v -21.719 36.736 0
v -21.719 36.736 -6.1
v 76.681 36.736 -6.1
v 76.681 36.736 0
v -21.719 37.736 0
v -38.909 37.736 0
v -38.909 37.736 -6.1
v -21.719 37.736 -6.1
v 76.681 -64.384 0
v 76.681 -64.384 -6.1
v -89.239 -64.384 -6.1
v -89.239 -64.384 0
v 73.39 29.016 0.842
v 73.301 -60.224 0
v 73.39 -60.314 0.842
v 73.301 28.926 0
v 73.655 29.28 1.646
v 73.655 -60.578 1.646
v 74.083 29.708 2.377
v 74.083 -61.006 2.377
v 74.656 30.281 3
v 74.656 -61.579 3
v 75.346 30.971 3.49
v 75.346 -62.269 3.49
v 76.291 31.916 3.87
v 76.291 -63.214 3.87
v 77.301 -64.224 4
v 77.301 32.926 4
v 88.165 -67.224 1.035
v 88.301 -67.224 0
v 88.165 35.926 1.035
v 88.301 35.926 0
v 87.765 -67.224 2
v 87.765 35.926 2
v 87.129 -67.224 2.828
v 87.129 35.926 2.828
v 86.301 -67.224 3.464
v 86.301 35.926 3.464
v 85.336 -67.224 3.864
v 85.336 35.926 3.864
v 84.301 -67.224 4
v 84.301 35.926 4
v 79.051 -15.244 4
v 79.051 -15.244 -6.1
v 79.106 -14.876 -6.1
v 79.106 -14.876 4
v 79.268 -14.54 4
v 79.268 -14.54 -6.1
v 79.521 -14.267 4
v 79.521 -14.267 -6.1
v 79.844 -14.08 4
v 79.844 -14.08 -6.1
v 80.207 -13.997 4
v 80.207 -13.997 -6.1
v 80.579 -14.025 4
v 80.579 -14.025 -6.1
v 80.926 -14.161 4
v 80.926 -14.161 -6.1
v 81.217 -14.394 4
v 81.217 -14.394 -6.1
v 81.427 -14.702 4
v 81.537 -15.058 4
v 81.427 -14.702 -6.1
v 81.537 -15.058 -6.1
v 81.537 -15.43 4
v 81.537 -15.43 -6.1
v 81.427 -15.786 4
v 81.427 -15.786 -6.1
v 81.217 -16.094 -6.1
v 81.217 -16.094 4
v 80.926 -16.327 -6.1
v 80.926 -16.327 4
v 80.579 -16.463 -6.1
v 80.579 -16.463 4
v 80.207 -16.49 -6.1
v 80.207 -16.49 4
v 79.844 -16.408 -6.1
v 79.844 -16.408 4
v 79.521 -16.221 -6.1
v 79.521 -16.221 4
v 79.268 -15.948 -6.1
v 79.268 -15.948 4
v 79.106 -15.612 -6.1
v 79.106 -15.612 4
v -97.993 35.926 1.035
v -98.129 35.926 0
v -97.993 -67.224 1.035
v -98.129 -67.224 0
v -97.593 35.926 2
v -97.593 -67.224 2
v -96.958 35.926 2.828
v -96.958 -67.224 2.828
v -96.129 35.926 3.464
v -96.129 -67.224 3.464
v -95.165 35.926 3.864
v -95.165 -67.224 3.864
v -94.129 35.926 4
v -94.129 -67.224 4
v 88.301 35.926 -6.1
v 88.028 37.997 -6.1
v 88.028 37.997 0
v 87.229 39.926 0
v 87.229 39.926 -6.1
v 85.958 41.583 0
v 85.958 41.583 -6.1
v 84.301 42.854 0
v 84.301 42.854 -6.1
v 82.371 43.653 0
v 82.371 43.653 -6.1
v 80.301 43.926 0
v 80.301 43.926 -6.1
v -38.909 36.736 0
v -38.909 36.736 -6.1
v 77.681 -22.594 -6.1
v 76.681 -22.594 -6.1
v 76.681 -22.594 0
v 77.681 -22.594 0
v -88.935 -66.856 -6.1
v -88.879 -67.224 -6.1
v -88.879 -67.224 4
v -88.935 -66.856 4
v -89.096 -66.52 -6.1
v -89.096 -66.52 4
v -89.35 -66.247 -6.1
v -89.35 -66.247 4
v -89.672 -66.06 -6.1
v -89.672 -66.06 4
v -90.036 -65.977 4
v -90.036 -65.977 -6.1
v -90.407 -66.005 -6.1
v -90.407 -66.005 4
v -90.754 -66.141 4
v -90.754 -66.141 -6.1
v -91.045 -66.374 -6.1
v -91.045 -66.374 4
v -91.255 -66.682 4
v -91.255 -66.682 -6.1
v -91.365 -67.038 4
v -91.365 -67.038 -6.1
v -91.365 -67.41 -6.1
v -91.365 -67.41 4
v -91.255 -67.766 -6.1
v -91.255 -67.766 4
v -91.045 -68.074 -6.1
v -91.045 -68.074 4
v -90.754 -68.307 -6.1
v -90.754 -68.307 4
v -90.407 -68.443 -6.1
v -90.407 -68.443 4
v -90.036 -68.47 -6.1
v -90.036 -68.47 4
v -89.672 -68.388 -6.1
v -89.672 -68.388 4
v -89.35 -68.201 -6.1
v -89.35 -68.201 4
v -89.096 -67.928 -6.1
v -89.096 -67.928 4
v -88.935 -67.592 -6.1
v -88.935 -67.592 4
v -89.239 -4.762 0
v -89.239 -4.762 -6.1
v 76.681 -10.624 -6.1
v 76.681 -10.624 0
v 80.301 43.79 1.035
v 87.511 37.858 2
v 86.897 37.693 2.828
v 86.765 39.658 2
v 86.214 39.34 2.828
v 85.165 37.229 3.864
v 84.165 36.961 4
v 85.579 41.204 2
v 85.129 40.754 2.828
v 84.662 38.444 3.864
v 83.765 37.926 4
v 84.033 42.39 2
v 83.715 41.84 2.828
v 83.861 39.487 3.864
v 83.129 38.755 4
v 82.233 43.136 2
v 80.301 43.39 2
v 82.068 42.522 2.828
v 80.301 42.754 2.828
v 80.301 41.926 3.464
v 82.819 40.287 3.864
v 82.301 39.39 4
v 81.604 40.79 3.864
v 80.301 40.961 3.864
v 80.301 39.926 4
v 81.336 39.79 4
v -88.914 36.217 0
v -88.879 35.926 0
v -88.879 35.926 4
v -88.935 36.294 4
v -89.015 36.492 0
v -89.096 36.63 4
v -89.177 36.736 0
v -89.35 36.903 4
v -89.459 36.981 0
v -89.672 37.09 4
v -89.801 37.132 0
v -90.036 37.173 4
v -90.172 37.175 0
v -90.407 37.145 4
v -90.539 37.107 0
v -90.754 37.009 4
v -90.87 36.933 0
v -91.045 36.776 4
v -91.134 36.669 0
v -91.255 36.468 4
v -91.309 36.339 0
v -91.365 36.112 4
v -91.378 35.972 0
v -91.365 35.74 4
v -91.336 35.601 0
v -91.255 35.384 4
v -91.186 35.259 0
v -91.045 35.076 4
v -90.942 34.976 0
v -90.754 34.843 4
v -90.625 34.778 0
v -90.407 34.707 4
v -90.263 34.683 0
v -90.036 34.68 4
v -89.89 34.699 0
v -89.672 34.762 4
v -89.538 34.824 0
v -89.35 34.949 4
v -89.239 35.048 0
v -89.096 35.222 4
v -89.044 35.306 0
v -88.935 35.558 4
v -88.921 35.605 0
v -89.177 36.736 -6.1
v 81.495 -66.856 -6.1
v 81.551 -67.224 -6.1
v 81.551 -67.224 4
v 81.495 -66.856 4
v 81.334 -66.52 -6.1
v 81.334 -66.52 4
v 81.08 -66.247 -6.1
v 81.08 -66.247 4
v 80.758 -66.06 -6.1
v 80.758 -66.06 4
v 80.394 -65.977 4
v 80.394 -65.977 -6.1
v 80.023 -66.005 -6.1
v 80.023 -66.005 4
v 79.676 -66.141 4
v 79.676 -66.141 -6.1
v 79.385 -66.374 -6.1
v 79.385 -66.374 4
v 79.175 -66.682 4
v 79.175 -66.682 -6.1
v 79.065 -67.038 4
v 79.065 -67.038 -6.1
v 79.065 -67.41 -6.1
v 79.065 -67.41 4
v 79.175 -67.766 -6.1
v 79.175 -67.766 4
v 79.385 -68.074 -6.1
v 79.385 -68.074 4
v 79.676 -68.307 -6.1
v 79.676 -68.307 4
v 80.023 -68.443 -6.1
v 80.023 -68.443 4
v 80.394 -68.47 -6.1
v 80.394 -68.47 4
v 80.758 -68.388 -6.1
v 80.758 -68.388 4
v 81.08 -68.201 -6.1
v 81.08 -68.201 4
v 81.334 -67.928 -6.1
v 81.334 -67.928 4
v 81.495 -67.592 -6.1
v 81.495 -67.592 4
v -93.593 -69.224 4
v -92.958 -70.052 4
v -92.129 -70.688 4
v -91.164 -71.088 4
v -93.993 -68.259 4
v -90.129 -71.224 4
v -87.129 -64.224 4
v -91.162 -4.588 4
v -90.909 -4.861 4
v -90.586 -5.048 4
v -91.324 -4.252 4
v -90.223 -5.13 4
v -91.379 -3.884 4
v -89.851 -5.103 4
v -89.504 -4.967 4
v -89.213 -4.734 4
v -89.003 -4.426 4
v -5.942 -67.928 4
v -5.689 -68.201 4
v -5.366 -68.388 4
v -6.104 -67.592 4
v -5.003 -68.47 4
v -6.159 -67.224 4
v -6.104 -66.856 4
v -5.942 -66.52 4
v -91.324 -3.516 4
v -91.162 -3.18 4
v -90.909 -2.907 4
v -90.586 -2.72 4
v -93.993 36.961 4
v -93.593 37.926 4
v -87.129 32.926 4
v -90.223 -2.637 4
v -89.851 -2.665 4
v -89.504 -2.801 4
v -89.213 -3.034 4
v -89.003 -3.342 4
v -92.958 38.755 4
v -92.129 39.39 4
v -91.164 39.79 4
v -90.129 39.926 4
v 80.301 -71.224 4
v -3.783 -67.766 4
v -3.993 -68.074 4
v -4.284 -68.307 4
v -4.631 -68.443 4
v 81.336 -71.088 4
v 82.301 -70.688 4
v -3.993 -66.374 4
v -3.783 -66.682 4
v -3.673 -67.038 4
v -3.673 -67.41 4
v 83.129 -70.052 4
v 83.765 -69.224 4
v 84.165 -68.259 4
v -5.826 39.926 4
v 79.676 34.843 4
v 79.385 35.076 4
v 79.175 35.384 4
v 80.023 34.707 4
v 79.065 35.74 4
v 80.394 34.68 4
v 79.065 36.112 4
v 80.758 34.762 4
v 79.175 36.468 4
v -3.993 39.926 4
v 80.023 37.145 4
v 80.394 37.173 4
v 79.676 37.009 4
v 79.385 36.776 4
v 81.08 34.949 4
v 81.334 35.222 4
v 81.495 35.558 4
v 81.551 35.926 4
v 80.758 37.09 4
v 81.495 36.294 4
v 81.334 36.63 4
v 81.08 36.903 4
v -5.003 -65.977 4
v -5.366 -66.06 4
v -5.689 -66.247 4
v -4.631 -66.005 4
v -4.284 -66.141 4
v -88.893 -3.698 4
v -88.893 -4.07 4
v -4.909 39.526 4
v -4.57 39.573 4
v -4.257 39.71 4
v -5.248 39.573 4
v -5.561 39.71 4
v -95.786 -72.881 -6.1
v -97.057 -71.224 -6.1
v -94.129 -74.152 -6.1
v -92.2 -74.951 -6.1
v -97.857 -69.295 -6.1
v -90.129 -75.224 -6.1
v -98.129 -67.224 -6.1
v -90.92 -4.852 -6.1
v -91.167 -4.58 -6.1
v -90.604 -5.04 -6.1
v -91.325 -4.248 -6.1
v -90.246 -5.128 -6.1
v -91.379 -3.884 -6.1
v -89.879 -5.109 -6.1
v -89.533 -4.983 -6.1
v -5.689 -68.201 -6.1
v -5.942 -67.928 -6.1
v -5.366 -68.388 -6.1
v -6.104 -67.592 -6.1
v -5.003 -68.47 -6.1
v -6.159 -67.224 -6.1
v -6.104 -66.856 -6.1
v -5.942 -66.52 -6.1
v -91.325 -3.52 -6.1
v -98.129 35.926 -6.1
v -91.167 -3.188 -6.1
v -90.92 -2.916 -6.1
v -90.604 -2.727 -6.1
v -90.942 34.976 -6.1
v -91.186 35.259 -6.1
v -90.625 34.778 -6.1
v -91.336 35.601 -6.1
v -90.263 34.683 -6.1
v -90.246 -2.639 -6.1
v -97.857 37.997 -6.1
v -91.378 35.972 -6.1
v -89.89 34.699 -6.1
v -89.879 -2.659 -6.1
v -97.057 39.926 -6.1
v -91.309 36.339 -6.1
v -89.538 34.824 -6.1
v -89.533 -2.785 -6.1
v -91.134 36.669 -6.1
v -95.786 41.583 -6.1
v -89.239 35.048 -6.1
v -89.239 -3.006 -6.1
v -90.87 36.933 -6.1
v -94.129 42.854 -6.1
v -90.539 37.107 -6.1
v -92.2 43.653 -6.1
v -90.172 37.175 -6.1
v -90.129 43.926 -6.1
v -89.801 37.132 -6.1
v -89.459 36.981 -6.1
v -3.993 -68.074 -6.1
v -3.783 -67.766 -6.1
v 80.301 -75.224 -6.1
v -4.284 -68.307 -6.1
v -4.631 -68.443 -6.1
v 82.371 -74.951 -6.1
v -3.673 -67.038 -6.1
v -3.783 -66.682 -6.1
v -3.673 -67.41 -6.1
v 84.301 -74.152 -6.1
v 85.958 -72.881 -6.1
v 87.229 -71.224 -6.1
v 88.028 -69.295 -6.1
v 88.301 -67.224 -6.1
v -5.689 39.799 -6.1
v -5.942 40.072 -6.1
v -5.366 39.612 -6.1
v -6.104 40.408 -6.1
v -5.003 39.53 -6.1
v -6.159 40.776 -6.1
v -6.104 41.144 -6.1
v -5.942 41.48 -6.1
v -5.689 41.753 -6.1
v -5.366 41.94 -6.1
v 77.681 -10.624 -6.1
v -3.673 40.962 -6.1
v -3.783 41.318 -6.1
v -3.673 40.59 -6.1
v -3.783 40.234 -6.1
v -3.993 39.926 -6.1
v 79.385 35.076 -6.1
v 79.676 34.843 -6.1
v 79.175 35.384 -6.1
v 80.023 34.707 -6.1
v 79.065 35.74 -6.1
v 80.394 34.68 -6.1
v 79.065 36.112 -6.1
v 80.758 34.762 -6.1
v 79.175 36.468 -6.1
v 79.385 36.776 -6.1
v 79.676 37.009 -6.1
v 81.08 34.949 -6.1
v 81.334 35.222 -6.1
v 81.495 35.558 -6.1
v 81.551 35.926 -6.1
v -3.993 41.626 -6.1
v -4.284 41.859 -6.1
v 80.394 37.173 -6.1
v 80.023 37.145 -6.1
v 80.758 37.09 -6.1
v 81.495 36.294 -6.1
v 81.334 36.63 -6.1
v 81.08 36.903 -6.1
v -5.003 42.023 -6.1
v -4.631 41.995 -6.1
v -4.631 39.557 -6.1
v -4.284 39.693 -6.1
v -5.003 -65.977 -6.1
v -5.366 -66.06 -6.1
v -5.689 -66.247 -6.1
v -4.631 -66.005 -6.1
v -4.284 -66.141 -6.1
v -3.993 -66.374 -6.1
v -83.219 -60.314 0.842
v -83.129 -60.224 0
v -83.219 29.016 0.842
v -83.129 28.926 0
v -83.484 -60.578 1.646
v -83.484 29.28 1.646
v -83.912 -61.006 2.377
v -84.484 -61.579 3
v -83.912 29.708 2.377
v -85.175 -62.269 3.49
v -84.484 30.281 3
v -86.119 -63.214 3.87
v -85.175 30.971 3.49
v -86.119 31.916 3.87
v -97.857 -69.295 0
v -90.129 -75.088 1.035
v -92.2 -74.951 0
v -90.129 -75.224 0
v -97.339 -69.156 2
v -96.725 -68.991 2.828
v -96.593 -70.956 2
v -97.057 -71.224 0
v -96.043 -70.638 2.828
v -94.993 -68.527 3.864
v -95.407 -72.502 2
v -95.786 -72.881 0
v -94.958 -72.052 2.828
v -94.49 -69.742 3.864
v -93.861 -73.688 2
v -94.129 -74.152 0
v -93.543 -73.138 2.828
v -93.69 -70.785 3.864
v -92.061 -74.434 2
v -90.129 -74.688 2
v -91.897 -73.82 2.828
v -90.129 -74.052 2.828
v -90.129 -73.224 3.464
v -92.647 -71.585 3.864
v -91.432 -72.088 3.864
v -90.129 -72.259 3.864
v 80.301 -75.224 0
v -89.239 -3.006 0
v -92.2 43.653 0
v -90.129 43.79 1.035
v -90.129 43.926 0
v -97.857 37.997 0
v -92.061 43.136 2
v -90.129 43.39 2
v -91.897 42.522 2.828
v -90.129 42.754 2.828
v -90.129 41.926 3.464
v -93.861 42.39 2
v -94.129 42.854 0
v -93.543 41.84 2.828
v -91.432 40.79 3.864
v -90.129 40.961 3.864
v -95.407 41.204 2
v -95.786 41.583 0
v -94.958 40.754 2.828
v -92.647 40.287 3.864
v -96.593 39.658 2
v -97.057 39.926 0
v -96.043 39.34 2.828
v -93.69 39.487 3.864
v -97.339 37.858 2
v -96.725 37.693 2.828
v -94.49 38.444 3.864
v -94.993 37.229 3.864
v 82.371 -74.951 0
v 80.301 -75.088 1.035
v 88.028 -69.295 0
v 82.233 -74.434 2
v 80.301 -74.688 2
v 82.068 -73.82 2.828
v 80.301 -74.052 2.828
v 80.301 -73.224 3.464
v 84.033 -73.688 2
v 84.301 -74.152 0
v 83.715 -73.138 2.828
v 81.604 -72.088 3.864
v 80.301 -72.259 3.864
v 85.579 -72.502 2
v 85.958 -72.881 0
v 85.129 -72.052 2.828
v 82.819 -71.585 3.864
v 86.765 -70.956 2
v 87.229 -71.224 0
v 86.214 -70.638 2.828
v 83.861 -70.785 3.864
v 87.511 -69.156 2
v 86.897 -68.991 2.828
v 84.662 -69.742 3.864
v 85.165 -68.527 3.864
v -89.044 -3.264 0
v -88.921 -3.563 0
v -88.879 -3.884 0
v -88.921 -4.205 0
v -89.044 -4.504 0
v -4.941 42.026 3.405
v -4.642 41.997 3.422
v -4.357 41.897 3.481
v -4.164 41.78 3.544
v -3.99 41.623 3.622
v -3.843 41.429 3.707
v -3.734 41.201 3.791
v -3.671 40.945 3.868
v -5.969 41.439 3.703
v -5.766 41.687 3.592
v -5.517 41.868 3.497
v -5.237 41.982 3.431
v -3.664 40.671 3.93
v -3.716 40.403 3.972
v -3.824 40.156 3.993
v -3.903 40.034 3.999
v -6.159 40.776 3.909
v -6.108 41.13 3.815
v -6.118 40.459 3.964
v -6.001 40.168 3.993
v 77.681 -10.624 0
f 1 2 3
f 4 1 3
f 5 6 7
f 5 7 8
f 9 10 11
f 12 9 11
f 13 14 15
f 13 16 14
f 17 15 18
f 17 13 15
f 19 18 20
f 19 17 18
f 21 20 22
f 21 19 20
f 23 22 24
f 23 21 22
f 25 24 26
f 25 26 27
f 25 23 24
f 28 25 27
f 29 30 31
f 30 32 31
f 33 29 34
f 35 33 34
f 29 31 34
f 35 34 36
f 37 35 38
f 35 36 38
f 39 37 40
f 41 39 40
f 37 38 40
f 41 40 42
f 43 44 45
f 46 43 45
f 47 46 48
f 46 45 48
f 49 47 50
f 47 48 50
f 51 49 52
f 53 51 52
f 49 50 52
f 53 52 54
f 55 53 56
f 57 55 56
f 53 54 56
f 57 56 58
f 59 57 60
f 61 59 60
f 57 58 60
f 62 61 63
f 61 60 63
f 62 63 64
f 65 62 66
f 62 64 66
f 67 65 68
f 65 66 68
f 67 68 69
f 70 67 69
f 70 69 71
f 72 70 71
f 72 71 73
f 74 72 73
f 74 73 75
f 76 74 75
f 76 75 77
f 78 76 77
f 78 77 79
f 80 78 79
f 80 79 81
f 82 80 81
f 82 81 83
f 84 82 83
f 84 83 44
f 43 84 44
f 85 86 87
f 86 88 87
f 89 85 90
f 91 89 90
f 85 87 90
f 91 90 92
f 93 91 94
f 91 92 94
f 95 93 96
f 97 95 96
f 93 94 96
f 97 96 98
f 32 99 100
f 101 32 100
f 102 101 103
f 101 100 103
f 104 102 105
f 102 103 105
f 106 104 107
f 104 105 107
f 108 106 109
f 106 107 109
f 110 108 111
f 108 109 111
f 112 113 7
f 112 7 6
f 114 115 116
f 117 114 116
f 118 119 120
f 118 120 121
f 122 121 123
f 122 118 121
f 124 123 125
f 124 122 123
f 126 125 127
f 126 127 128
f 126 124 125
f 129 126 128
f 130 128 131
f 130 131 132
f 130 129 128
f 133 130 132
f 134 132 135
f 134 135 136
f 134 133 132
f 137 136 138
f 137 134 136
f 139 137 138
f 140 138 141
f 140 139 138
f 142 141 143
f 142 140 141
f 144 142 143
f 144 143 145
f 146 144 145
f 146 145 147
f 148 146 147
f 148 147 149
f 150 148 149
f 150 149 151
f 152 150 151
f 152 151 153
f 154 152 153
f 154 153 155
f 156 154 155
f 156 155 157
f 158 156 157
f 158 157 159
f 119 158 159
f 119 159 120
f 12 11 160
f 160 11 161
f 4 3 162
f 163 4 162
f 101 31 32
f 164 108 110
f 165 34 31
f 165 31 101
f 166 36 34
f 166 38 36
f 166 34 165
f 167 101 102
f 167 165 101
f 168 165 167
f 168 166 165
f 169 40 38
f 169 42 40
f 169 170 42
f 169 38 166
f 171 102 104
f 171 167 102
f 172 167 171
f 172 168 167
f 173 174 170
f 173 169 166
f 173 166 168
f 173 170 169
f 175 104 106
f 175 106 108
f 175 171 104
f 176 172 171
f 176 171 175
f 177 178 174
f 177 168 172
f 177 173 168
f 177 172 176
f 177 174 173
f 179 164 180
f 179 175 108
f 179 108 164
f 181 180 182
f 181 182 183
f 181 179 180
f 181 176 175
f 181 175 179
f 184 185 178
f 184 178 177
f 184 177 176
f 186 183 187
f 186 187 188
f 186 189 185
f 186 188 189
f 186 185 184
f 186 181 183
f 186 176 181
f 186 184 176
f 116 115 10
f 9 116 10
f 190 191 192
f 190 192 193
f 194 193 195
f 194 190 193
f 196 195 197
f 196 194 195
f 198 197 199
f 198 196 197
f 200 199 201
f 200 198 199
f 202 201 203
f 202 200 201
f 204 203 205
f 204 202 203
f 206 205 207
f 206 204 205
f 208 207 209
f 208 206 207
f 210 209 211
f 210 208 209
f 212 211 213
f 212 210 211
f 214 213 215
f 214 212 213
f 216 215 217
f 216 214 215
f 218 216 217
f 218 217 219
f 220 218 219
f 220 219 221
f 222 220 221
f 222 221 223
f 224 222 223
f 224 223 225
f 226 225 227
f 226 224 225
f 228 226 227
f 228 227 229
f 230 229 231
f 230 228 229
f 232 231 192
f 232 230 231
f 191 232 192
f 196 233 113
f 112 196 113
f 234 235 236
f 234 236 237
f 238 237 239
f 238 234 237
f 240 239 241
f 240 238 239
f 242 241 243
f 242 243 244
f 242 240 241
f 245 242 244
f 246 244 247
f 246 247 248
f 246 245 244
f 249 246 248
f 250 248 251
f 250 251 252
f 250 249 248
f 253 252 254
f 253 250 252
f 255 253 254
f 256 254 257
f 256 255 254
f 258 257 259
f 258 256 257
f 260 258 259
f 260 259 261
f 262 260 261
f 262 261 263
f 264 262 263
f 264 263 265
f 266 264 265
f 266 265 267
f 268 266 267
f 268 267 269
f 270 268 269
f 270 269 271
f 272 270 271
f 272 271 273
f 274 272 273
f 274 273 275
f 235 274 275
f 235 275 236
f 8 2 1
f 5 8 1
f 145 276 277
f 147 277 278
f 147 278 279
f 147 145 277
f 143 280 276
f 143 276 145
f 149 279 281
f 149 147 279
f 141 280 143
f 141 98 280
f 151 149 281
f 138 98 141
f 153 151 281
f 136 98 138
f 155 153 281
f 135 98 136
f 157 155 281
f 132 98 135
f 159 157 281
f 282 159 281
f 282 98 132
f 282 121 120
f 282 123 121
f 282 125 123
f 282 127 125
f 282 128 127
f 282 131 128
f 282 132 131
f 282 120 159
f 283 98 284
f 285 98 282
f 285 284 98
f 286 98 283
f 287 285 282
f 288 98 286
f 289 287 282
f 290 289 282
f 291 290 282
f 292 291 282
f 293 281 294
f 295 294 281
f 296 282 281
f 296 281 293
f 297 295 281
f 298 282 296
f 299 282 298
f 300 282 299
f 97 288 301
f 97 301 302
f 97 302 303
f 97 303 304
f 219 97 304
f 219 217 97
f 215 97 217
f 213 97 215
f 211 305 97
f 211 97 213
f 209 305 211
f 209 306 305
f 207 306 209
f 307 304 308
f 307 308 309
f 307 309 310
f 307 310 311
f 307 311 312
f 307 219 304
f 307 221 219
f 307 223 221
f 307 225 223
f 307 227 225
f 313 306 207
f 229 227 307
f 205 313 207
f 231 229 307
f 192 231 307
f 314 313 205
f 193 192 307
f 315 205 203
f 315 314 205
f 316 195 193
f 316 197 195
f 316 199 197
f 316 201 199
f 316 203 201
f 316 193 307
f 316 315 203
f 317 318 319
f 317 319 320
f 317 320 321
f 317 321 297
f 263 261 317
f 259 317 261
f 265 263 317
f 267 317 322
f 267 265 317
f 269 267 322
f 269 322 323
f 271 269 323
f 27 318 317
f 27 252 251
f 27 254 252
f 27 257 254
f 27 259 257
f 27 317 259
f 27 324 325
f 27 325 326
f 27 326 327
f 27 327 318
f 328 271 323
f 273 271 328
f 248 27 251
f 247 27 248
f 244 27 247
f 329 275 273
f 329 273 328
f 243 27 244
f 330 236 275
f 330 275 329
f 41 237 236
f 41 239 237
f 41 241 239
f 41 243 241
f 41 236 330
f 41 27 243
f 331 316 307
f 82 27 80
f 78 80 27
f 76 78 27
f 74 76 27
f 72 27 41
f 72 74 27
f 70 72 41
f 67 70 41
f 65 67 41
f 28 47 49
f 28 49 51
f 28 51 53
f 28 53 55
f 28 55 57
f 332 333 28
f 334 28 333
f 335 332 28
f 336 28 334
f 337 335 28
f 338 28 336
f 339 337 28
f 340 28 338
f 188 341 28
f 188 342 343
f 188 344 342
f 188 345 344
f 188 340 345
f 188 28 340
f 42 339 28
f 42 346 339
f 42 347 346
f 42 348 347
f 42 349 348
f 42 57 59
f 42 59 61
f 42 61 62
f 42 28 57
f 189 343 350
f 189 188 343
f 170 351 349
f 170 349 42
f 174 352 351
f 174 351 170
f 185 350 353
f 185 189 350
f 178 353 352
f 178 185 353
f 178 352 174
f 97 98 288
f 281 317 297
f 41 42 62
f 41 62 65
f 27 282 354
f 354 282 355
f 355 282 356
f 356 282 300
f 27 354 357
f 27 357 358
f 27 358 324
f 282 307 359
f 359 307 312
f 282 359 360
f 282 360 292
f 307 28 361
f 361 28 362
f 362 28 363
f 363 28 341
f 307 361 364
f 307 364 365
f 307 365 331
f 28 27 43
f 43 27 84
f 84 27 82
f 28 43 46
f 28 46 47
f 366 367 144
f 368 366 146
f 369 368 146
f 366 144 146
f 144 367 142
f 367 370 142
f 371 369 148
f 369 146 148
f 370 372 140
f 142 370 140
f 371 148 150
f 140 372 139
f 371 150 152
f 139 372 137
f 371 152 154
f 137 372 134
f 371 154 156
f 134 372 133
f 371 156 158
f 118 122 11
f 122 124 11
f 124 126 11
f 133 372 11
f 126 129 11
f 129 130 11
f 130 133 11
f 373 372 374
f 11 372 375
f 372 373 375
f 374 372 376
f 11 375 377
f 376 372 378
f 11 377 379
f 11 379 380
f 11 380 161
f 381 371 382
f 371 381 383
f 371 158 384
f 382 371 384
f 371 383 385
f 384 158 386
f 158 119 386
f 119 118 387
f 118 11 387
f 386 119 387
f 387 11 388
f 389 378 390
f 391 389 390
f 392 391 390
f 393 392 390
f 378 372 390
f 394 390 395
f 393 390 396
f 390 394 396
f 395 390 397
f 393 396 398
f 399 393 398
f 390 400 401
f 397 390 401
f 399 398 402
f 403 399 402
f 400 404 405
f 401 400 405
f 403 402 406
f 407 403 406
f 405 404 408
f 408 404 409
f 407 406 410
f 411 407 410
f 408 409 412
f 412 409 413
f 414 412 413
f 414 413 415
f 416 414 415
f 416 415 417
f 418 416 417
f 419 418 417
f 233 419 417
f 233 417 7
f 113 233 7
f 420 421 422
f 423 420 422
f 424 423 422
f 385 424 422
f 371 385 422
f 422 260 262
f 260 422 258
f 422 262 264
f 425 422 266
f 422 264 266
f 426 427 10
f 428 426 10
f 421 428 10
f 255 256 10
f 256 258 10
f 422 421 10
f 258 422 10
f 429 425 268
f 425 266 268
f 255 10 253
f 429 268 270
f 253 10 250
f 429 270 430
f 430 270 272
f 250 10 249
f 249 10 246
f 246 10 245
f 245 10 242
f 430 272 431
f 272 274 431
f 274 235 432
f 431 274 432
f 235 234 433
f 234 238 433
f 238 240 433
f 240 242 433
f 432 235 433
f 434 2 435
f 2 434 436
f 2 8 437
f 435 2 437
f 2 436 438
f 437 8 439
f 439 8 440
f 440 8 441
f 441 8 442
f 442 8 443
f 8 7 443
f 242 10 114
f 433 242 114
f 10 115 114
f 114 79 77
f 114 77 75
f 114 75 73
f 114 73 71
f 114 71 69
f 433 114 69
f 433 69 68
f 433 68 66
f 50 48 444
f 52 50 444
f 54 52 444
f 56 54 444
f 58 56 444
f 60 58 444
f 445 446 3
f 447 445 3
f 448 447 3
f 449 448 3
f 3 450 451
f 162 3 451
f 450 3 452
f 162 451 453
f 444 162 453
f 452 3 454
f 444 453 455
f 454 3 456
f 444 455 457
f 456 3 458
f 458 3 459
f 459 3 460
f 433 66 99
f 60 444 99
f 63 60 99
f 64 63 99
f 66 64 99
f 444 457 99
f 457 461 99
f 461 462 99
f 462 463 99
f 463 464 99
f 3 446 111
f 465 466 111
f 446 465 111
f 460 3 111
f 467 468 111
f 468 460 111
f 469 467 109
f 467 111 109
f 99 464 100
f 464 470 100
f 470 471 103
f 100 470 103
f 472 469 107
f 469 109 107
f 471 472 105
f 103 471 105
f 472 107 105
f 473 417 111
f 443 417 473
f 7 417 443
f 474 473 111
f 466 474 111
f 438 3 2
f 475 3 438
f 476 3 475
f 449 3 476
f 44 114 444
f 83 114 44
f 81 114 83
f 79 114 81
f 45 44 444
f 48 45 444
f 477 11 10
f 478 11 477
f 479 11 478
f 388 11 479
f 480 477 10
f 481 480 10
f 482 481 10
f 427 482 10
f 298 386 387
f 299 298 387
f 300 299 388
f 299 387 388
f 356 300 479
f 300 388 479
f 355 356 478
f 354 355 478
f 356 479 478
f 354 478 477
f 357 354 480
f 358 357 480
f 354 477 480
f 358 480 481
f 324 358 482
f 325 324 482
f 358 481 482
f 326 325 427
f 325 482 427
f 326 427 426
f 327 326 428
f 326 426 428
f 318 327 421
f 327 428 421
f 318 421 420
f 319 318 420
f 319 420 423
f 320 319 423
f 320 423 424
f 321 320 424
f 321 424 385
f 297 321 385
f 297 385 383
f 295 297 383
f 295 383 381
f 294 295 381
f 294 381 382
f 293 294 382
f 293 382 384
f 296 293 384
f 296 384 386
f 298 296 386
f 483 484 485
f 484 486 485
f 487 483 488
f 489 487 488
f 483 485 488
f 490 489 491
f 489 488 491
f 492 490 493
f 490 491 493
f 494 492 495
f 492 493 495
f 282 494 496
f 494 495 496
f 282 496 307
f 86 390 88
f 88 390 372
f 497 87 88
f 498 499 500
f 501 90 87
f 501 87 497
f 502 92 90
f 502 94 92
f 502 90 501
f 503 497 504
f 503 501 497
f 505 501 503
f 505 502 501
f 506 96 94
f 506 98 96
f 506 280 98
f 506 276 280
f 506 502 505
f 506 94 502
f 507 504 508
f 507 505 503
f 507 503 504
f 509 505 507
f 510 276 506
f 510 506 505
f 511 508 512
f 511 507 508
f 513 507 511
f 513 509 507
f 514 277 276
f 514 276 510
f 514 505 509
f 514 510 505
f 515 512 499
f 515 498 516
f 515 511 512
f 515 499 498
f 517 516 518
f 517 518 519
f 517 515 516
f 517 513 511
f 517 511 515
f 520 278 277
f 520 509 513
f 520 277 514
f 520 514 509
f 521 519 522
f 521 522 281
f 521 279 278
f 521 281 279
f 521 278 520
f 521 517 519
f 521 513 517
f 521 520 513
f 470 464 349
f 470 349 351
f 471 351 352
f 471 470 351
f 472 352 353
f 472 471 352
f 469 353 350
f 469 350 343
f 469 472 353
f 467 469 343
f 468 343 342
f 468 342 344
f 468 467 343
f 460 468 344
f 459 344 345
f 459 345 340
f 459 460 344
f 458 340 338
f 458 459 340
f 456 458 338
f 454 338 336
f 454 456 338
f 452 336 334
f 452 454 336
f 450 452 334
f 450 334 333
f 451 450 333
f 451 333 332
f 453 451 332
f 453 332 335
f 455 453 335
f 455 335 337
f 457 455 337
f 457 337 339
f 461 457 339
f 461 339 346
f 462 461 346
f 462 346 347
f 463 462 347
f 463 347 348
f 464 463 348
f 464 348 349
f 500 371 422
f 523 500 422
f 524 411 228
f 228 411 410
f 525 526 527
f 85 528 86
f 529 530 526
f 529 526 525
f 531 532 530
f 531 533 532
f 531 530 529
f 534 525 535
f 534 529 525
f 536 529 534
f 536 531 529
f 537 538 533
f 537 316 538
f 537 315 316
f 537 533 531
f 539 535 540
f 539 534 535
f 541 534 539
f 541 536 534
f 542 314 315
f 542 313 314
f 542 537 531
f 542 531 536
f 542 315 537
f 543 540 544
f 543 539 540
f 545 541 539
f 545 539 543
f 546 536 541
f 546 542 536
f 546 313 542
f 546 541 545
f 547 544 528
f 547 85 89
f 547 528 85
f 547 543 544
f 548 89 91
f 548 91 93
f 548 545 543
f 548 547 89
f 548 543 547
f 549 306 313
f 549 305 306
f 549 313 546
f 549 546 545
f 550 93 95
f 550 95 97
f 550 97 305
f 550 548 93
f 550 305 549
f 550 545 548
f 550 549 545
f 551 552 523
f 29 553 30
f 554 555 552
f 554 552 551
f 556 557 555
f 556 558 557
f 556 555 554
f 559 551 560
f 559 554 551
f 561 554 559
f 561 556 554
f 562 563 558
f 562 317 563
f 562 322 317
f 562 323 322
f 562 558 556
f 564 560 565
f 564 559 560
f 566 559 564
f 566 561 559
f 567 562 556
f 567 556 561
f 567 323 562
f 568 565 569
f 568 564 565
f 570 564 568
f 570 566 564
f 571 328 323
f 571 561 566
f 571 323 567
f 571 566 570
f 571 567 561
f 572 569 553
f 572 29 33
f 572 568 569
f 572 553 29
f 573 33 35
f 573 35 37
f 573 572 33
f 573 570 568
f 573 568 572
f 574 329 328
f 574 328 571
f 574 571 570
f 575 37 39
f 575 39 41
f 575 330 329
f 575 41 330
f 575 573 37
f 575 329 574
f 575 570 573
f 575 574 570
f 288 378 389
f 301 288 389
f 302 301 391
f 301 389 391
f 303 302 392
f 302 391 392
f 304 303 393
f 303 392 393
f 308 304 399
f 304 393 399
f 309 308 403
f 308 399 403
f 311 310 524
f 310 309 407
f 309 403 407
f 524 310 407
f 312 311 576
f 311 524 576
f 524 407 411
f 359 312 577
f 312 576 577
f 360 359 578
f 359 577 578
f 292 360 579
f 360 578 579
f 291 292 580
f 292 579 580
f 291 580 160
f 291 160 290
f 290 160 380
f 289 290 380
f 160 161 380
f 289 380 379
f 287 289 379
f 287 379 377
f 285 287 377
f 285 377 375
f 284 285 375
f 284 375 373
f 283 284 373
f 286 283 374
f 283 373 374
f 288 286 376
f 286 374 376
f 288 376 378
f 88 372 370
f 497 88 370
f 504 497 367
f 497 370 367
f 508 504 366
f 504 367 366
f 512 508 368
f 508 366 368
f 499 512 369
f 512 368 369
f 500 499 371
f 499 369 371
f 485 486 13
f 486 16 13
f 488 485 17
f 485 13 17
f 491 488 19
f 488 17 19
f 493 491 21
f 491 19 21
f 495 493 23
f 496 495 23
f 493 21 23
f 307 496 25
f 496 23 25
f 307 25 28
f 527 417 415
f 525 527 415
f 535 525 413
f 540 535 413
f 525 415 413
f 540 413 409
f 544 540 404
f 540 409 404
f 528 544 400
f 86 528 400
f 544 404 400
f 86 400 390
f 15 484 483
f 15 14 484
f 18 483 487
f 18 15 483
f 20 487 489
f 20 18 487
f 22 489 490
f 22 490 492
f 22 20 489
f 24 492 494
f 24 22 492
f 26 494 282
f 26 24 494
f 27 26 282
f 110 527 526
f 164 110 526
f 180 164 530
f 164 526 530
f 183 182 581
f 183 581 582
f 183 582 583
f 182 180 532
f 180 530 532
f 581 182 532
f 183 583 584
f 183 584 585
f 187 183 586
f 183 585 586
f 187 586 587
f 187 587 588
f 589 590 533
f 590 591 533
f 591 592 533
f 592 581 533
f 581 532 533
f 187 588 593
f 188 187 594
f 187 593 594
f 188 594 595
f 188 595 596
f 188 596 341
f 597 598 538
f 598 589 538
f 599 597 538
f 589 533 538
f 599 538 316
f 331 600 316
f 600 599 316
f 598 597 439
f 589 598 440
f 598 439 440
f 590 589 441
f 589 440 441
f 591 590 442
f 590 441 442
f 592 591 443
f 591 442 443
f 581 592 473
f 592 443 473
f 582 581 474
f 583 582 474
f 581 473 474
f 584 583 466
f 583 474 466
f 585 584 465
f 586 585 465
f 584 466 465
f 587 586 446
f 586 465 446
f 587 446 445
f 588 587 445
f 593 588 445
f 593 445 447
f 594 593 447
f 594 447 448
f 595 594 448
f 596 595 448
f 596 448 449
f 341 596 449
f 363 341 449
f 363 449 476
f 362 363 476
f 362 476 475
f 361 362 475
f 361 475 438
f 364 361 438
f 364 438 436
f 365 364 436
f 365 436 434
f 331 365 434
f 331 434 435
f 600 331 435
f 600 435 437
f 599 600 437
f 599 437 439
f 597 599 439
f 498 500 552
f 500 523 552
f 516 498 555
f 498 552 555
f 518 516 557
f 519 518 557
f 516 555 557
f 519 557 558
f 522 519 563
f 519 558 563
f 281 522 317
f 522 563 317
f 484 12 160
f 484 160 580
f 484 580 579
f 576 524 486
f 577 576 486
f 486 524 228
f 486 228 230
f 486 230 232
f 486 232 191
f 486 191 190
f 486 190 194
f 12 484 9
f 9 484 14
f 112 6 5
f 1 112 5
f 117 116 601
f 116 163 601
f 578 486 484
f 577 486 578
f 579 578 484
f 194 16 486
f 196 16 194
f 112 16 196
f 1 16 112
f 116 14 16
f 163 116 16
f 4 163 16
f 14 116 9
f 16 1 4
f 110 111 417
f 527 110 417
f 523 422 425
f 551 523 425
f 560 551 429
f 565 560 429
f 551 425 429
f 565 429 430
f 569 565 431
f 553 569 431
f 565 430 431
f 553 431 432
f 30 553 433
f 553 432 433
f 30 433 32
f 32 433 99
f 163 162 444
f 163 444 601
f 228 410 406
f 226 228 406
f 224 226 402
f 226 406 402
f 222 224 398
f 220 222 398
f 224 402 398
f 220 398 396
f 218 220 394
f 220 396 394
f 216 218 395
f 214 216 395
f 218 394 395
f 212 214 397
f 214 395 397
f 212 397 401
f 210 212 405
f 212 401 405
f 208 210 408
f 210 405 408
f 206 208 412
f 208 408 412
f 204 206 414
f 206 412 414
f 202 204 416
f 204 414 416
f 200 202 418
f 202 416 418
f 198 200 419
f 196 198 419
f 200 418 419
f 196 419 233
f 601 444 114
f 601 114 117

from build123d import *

# Parameters (mm, degrees)
SKETCH1_R           = 1.25
SKETCH1_W           = 156.43
SKETCH1_H           = 89.15
BOSS_EXTRUDE1_DEPTH = 4
BOSS_EXTRUDE2_START = -6.1
SKETCH1_3_R         = 1.25
BOSS_EXTRUDE2_DEPTH = 6.1
FILLET1_R           = 4
SKETCH2_W           = 17.19
SKETCH2_H           = 6.1
CUT_EXTRUDE1_DEPTH  = 1
SKETCH3_W           = 6.1
SKETCH3_H           = 11.97
CUT_EXTRUDE2_DEPTH  = 1
SKETCH4_R           = 1.25
CUT_EXTRUDE3_DEPTH  = 125.056407333


with BuildPart() as part:
    # Sketch1 → Boss-Extrude1 (new body)
    with BuildSketch(Plane.XY):
        with BuildLine():
            Line((-98.129170507, 35.926013825), (-98.129170507, -67.223986175))
            ThreePointArc((-98.129170507, -67.223986175), (-95.786024756, -72.880840425), (-90.129170507, -75.223986175))
            Line((-90.129170507, -75.223986175), (80.300829493, -75.223986175))
            ThreePointArc((80.300829493, -75.223986175), (85.957683743, -72.880840425), (88.300829493, -67.223986175))
            Line((88.300829493, -67.223986175), (88.300829493, 35.926013825))
            ThreePointArc((88.300829493, 35.926013825), (85.957683743, 41.582868074), (80.300829493, 43.926013825))
            Line((80.300829493, 43.926013825), (-90.129170507, 43.926013825))
            ThreePointArc((-90.129170507, 43.926013825), (-95.786024756, 41.582868074), (-98.129170507, 35.926013825))
        make_face()
        with Locations((80.300829493, 35.926013825)):
            Circle(SKETCH1_R, mode=Mode.SUBTRACT)
        with Locations((80.300829493, -67.223986175)):
            Circle(SKETCH1_R, mode=Mode.SUBTRACT)
        with Locations((-90.129170507, -67.223986175)):
            Circle(SKETCH1_R, mode=Mode.SUBTRACT)
        with Locations((-90.129170507, 35.926013825)):
            Circle(SKETCH1_R, mode=Mode.SUBTRACT)
        with Locations((-4.914170507, -15.648986175)):
            Rectangle(SKETCH1_W, SKETCH1_H, mode=Mode.SUBTRACT)
    extrude(amount=BOSS_EXTRUDE1_DEPTH)

    # Sketch1<3> → Boss-Extrude2 (add)
    with BuildSketch(Plane.XY.offset(BOSS_EXTRUDE2_START)):
        with BuildLine():
            ThreePointArc((-90.129170507, 43.926013825), (-95.786024756, 41.582868074), (-98.129170507, 35.926013825))
            Line((-98.129170507, 35.926013825), (-98.129170507, -67.223986175))
            ThreePointArc((-98.129170507, -67.223986175), (-95.786024756, -72.880840425), (-90.129170507, -75.223986175))
            Line((-90.129170507, -75.223986175), (80.300829493, -75.223986175))
            ThreePointArc((80.300829493, -75.223986175), (85.957683743, -72.880840425), (88.300829493, -67.223986175))
            Line((88.300829493, -67.223986175), (88.300829493, 35.926013825))
            ThreePointArc((88.300829493, 35.926013825), (85.957683743, 41.582868074), (80.300829493, 43.926013825))
            Line((80.300829493, 43.926013825), (-90.129170507, 43.926013825))
        make_face()
        with Locations((-90.129170507, -67.223986175)):
            Circle(SKETCH1_3_R, mode=Mode.SUBTRACT)
        with Locations((80.300829493, -67.223986175)):
            Circle(SKETCH1_3_R, mode=Mode.SUBTRACT)
        with BuildLine():
            Line((-89.239170507, -64.383986175), (-89.239170507, 35.048289495))
            ThreePointArc((-89.239170507, 35.048289495), (-91.378326538, 35.97193996), (-89.177120088, 36.736013825))
            Line((-89.177120088, 36.736013825), (76.680829493, 36.736013825))
            Line((76.680829493, 36.736013825), (76.680829493, -64.383986175))
            Line((76.680829493, -64.383986175), (-89.239170507, -64.383986175))
        make_face(mode=Mode.SUBTRACT)
        with Locations((80.300829493, 35.926013825)):
            Circle(SKETCH1_3_R, mode=Mode.SUBTRACT)
    extrude(amount=BOSS_EXTRUDE2_DEPTH)

    # Fillet1
    fillet1_edges = [part.edges().sort_by_distance(p)[0] for p in [
        (-95.786024756, 41.582868074, 4),
        (-4.914170507, 43.926013825, 4),
        (85.957683743, 41.582868074, 4),
        (88.300829493, -15.648986175, 4),
        (85.957683743, -72.880840425, 4),
        (-4.914170507, -75.223986175, 4),
        (-95.786024756, -72.880840425, 4),
        (-4.914170507, -60.223986175, 4),
        (-4.914170507, 28.926013825, 4),
        (-83.129170507, -15.648986175, 4),
        (73.300829493, -15.648986175, 4),
        (-98.129170507, -15.648986175, 4),
    ]]
    fillet(fillet1_edges, radius=FILLET1_R - 0.0001)  # a hair under: the kernel refuses the full size

    # Sketch2 → Cut-Extrude1 (cut)
    with BuildSketch(Plane.XZ.offset(-36.736013825)):
        with Locations((-30.314170507, -3.05)):
            Rectangle(SKETCH2_W, SKETCH2_H)
    extrude(amount=-CUT_EXTRUDE1_DEPTH, mode=Mode.SUBTRACT)

    # Sketch3 → Cut-Extrude2 (cut)
    with BuildSketch(Plane.ZY.offset(-76.680829493)):
        with Locations((-3.05, -16.608986175)):
            Rectangle(SKETCH3_W, SKETCH3_H)
    extrude(amount=-CUT_EXTRUDE2_DEPTH, mode=Mode.SUBTRACT)

    # Sketch4 → Cut-Extrude3 (cut, through all)
    with BuildSketch(Plane(origin=(0, 0, -6.1), x_dir=(-1, 0, 0), z_dir=(0, 0, -1))):
        with Locations((4.909170507, 40.776013825)):
            Circle(SKETCH4_R)
        with Locations((-80.300829493, -15.243986175)):
            Circle(SKETCH4_R)
        with Locations((4.909170507, -67.223986175)):
            Circle(SKETCH4_R)
        with Locations((90.129170507, -3.883986175)):
            Circle(SKETCH4_R)
    extrude(amount=-CUT_EXTRUDE3_DEPTH, mode=Mode.SUBTRACT)


solid = part.part
